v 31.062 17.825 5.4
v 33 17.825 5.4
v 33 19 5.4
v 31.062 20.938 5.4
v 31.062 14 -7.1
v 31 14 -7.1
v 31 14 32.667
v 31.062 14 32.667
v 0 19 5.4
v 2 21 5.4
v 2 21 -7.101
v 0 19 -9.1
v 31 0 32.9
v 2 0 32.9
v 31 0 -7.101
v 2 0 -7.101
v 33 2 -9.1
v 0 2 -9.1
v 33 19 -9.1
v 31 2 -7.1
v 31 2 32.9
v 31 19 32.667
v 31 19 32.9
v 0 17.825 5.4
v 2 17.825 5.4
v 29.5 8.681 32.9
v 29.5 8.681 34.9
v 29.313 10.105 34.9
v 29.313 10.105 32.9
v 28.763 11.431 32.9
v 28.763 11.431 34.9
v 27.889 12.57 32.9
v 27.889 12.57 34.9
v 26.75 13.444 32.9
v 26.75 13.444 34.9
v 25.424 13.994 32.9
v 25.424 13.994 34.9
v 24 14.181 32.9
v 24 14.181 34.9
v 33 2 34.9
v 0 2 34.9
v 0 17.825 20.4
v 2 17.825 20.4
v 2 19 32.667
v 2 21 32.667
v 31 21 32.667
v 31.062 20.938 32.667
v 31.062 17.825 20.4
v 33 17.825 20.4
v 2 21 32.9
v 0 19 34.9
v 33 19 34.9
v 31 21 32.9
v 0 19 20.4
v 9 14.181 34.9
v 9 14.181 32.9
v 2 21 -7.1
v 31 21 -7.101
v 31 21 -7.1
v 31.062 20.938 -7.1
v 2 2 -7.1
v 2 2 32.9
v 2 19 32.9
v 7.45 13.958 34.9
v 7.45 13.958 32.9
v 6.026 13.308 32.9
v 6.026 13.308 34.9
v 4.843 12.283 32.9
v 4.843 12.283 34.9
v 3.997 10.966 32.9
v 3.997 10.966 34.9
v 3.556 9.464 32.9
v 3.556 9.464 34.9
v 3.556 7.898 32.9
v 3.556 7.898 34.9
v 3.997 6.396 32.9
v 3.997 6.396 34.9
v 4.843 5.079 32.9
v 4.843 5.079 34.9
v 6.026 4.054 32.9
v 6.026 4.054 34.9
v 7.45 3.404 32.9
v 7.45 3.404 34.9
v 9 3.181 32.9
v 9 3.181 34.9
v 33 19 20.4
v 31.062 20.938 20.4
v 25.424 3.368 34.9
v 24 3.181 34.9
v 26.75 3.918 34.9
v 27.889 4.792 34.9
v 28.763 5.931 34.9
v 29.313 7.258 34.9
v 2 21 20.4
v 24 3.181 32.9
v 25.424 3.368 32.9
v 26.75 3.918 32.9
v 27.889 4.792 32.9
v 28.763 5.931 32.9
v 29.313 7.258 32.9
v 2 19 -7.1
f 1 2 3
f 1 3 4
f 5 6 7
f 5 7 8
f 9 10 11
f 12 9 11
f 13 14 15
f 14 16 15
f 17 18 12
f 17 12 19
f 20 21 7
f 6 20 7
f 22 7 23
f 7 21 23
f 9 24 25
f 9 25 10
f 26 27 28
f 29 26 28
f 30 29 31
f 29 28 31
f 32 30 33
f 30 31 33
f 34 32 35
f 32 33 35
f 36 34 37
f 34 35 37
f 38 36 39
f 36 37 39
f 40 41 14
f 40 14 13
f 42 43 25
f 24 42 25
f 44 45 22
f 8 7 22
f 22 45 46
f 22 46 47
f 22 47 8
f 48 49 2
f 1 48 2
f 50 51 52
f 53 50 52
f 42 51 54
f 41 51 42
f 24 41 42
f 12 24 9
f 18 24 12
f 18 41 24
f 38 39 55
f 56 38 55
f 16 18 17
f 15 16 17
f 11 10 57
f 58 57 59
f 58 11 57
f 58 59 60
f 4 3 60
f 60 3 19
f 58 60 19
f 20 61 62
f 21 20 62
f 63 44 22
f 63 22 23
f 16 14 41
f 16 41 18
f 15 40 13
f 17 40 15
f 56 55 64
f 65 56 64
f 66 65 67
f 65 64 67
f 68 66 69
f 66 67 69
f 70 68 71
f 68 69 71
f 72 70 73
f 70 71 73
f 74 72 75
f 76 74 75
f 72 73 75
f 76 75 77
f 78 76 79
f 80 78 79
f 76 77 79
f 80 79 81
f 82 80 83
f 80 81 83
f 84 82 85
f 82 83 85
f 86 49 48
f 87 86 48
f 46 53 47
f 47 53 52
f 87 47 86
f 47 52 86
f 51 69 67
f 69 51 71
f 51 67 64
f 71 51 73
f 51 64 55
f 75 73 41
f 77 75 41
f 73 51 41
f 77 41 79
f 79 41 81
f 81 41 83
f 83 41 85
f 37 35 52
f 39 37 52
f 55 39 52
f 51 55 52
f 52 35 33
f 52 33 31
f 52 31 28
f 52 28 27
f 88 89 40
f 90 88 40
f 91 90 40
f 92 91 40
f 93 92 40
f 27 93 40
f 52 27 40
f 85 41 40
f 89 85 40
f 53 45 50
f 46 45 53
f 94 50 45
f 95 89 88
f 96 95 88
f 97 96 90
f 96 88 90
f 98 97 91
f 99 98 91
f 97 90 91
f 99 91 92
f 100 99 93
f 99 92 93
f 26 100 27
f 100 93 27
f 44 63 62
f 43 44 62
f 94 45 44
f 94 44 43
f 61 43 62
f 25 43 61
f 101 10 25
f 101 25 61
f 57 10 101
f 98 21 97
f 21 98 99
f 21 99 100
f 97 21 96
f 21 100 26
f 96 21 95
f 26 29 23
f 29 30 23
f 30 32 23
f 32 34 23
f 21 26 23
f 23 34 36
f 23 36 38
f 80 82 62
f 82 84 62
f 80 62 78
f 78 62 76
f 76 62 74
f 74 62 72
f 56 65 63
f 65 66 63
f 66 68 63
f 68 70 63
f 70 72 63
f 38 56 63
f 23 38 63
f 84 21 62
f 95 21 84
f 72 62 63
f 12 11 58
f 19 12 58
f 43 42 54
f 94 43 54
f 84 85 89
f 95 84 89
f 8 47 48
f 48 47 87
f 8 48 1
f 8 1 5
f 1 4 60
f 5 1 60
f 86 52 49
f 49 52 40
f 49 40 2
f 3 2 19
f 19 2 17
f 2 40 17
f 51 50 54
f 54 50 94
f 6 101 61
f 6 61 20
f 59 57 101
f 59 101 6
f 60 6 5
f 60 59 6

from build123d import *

# Parameters (mm, degrees)
SKETCH1_W           = 33
SKETCH1_H           = 44
BOSS_EXTRUDE1_DEPTH = 21
SHELL1_START        = 2
SHELL1_OUTLINE_W    = 17
SHELL1_OUTLINE_H    = 40
SHELL1_DEPTH        = 29
SKETCH2_W           = 29.062005015
SKETCH2_H           = 39.767253615
CUT_EXTRUDE1_DEPTH  = 7
CUT_EXTRUDE2_DEPTH  = 7
SKETCH4_W           = 15
SKETCH4_H           = 3.175
CUT_EXTRUDE3_DEPTH  = 45
CHAMFER1_SIZE       = 2


# Read off the part's stored shape, not the designer's step: Shell1
with BuildPart() as part:
    # Sketch1 → Boss-Extrude1 (new body)
    with BuildSketch(Plane(origin=(0, 0, 0), x_dir=(1, 0, 0), z_dir=(0, 1, 0))):
        with Locations((16.5, -12.899591929)):
            Rectangle(SKETCH1_W, SKETCH1_H)
    extrude(amount=BOSS_EXTRUDE1_DEPTH)

    # Shell1 outline → Shell1 (cut)
    with BuildSketch(Plane.YZ.offset(SHELL1_START)):
        with Locations((10.5, 12.899591929)):
            Rectangle(SHELL1_OUTLINE_W, SHELL1_OUTLINE_H)
    extrude(amount=SHELL1_DEPTH, mode=Mode.SUBTRACT)

    # Sketch2 → Cut-Extrude1 (cut)
    with BuildSketch(Plane(origin=(0, 21, 0), x_dir=(1, 0, 0), z_dir=(0, 1, 0))):
        with Locations((16.531002507, -12.783218737)):
            Rectangle(SKETCH2_W, SKETCH2_H)
    extrude(amount=-CUT_EXTRUDE1_DEPTH, mode=Mode.SUBTRACT)

    # Sketch3 → Cut-Extrude2 (cut)
    with BuildSketch(Plane.XY.offset(34.899591929)):
        with BuildLine():
            ThreePointArc((14.5, 8.681065769), (12.889087297, 12.570153065), (9, 14.181065769))
            Line((9, 14.181065769), (9, 3.181065769))
            ThreePointArc((9, 3.181065769), (12.889087297, 4.791978472), (14.5, 8.681065769))
        make_face()
        with BuildLine():
            Line((9, 3.181065769), (9, 14.181065769))
            ThreePointArc((9, 14.181065769), (3.5, 8.681065769), (9, 3.181065769))
        make_face()
        with BuildLine():
            Line((16.5, 3.181065769), (16.5, 14.181065769))
            Line((16.5, 14.181065769), (9, 14.181065769))
            ThreePointArc((9, 14.181065769), (12.889087297, 12.570153065), (14.5, 8.681065769))
            ThreePointArc((14.5, 8.681065769), (12.889087297, 4.791978472), (9, 3.181065769))
            Line((9, 3.181065769), (16.5, 3.181065769))
        make_face()
        with BuildLine():
            ThreePointArc((24, 3.181065769), (18.5, 8.681065769), (24, 14.181065769))
            Line((24, 14.181065769), (16.5, 14.181065769))
            Line((16.5, 14.181065769), (16.5, 3.181065769))
            Line((16.5, 3.181065769), (24, 3.181065769))
        make_face()
        with BuildLine():
            ThreePointArc((29.5, 8.681065769), (27.889087297, 12.570153065), (24, 14.181065769))
            Line((24, 14.181065769), (24, 3.181065769))
            ThreePointArc((24, 3.181065769), (27.889087297, 4.791978472), (29.5, 8.681065769))
        make_face()
        with BuildLine():
            Line((24, 3.181065769), (24, 14.181065769))
            ThreePointArc((24, 14.181065769), (18.5, 8.681065769), (24, 3.181065769))
        make_face()
    extrude(amount=-CUT_EXTRUDE2_DEPTH, mode=Mode.SUBTRACT)

    # Sketch4 → Cut-Extrude3 (cut)
    with BuildSketch(Plane(origin=(33, 0, 0), x_dir=(0, 0, -1), z_dir=(1, 0, 0))):
        with Locations((-12.899591929, 19.4125)):
            Rectangle(SKETCH4_W, SKETCH4_H)
    extrude(amount=-CUT_EXTRUDE3_DEPTH, mode=Mode.SUBTRACT)

    # Chamfer1
    chamfer1_edges = [part.edges().sort_by_distance(p)[0] for p in [
        (16.5, 0, 34.899591929),
        (33, 0, 12.899591929),
        (16.5, 0, -9.100408071),
        (0, 0, 12.899591929),
        (33, 21, -1.850408071),
        (16.5, 21, -9.100408071),
        (0, 21, -1.850408071),
        (0, 21, 27.649591929),
        (16.5, 21, 34.899591929),
        (33, 21, 27.649591929),
    ]]
    chamfer(chamfer1_edges, length=CHAMFER1_SIZE - 0.0001)  # a hair under: the kernel refuses the full size


solid = part.part
